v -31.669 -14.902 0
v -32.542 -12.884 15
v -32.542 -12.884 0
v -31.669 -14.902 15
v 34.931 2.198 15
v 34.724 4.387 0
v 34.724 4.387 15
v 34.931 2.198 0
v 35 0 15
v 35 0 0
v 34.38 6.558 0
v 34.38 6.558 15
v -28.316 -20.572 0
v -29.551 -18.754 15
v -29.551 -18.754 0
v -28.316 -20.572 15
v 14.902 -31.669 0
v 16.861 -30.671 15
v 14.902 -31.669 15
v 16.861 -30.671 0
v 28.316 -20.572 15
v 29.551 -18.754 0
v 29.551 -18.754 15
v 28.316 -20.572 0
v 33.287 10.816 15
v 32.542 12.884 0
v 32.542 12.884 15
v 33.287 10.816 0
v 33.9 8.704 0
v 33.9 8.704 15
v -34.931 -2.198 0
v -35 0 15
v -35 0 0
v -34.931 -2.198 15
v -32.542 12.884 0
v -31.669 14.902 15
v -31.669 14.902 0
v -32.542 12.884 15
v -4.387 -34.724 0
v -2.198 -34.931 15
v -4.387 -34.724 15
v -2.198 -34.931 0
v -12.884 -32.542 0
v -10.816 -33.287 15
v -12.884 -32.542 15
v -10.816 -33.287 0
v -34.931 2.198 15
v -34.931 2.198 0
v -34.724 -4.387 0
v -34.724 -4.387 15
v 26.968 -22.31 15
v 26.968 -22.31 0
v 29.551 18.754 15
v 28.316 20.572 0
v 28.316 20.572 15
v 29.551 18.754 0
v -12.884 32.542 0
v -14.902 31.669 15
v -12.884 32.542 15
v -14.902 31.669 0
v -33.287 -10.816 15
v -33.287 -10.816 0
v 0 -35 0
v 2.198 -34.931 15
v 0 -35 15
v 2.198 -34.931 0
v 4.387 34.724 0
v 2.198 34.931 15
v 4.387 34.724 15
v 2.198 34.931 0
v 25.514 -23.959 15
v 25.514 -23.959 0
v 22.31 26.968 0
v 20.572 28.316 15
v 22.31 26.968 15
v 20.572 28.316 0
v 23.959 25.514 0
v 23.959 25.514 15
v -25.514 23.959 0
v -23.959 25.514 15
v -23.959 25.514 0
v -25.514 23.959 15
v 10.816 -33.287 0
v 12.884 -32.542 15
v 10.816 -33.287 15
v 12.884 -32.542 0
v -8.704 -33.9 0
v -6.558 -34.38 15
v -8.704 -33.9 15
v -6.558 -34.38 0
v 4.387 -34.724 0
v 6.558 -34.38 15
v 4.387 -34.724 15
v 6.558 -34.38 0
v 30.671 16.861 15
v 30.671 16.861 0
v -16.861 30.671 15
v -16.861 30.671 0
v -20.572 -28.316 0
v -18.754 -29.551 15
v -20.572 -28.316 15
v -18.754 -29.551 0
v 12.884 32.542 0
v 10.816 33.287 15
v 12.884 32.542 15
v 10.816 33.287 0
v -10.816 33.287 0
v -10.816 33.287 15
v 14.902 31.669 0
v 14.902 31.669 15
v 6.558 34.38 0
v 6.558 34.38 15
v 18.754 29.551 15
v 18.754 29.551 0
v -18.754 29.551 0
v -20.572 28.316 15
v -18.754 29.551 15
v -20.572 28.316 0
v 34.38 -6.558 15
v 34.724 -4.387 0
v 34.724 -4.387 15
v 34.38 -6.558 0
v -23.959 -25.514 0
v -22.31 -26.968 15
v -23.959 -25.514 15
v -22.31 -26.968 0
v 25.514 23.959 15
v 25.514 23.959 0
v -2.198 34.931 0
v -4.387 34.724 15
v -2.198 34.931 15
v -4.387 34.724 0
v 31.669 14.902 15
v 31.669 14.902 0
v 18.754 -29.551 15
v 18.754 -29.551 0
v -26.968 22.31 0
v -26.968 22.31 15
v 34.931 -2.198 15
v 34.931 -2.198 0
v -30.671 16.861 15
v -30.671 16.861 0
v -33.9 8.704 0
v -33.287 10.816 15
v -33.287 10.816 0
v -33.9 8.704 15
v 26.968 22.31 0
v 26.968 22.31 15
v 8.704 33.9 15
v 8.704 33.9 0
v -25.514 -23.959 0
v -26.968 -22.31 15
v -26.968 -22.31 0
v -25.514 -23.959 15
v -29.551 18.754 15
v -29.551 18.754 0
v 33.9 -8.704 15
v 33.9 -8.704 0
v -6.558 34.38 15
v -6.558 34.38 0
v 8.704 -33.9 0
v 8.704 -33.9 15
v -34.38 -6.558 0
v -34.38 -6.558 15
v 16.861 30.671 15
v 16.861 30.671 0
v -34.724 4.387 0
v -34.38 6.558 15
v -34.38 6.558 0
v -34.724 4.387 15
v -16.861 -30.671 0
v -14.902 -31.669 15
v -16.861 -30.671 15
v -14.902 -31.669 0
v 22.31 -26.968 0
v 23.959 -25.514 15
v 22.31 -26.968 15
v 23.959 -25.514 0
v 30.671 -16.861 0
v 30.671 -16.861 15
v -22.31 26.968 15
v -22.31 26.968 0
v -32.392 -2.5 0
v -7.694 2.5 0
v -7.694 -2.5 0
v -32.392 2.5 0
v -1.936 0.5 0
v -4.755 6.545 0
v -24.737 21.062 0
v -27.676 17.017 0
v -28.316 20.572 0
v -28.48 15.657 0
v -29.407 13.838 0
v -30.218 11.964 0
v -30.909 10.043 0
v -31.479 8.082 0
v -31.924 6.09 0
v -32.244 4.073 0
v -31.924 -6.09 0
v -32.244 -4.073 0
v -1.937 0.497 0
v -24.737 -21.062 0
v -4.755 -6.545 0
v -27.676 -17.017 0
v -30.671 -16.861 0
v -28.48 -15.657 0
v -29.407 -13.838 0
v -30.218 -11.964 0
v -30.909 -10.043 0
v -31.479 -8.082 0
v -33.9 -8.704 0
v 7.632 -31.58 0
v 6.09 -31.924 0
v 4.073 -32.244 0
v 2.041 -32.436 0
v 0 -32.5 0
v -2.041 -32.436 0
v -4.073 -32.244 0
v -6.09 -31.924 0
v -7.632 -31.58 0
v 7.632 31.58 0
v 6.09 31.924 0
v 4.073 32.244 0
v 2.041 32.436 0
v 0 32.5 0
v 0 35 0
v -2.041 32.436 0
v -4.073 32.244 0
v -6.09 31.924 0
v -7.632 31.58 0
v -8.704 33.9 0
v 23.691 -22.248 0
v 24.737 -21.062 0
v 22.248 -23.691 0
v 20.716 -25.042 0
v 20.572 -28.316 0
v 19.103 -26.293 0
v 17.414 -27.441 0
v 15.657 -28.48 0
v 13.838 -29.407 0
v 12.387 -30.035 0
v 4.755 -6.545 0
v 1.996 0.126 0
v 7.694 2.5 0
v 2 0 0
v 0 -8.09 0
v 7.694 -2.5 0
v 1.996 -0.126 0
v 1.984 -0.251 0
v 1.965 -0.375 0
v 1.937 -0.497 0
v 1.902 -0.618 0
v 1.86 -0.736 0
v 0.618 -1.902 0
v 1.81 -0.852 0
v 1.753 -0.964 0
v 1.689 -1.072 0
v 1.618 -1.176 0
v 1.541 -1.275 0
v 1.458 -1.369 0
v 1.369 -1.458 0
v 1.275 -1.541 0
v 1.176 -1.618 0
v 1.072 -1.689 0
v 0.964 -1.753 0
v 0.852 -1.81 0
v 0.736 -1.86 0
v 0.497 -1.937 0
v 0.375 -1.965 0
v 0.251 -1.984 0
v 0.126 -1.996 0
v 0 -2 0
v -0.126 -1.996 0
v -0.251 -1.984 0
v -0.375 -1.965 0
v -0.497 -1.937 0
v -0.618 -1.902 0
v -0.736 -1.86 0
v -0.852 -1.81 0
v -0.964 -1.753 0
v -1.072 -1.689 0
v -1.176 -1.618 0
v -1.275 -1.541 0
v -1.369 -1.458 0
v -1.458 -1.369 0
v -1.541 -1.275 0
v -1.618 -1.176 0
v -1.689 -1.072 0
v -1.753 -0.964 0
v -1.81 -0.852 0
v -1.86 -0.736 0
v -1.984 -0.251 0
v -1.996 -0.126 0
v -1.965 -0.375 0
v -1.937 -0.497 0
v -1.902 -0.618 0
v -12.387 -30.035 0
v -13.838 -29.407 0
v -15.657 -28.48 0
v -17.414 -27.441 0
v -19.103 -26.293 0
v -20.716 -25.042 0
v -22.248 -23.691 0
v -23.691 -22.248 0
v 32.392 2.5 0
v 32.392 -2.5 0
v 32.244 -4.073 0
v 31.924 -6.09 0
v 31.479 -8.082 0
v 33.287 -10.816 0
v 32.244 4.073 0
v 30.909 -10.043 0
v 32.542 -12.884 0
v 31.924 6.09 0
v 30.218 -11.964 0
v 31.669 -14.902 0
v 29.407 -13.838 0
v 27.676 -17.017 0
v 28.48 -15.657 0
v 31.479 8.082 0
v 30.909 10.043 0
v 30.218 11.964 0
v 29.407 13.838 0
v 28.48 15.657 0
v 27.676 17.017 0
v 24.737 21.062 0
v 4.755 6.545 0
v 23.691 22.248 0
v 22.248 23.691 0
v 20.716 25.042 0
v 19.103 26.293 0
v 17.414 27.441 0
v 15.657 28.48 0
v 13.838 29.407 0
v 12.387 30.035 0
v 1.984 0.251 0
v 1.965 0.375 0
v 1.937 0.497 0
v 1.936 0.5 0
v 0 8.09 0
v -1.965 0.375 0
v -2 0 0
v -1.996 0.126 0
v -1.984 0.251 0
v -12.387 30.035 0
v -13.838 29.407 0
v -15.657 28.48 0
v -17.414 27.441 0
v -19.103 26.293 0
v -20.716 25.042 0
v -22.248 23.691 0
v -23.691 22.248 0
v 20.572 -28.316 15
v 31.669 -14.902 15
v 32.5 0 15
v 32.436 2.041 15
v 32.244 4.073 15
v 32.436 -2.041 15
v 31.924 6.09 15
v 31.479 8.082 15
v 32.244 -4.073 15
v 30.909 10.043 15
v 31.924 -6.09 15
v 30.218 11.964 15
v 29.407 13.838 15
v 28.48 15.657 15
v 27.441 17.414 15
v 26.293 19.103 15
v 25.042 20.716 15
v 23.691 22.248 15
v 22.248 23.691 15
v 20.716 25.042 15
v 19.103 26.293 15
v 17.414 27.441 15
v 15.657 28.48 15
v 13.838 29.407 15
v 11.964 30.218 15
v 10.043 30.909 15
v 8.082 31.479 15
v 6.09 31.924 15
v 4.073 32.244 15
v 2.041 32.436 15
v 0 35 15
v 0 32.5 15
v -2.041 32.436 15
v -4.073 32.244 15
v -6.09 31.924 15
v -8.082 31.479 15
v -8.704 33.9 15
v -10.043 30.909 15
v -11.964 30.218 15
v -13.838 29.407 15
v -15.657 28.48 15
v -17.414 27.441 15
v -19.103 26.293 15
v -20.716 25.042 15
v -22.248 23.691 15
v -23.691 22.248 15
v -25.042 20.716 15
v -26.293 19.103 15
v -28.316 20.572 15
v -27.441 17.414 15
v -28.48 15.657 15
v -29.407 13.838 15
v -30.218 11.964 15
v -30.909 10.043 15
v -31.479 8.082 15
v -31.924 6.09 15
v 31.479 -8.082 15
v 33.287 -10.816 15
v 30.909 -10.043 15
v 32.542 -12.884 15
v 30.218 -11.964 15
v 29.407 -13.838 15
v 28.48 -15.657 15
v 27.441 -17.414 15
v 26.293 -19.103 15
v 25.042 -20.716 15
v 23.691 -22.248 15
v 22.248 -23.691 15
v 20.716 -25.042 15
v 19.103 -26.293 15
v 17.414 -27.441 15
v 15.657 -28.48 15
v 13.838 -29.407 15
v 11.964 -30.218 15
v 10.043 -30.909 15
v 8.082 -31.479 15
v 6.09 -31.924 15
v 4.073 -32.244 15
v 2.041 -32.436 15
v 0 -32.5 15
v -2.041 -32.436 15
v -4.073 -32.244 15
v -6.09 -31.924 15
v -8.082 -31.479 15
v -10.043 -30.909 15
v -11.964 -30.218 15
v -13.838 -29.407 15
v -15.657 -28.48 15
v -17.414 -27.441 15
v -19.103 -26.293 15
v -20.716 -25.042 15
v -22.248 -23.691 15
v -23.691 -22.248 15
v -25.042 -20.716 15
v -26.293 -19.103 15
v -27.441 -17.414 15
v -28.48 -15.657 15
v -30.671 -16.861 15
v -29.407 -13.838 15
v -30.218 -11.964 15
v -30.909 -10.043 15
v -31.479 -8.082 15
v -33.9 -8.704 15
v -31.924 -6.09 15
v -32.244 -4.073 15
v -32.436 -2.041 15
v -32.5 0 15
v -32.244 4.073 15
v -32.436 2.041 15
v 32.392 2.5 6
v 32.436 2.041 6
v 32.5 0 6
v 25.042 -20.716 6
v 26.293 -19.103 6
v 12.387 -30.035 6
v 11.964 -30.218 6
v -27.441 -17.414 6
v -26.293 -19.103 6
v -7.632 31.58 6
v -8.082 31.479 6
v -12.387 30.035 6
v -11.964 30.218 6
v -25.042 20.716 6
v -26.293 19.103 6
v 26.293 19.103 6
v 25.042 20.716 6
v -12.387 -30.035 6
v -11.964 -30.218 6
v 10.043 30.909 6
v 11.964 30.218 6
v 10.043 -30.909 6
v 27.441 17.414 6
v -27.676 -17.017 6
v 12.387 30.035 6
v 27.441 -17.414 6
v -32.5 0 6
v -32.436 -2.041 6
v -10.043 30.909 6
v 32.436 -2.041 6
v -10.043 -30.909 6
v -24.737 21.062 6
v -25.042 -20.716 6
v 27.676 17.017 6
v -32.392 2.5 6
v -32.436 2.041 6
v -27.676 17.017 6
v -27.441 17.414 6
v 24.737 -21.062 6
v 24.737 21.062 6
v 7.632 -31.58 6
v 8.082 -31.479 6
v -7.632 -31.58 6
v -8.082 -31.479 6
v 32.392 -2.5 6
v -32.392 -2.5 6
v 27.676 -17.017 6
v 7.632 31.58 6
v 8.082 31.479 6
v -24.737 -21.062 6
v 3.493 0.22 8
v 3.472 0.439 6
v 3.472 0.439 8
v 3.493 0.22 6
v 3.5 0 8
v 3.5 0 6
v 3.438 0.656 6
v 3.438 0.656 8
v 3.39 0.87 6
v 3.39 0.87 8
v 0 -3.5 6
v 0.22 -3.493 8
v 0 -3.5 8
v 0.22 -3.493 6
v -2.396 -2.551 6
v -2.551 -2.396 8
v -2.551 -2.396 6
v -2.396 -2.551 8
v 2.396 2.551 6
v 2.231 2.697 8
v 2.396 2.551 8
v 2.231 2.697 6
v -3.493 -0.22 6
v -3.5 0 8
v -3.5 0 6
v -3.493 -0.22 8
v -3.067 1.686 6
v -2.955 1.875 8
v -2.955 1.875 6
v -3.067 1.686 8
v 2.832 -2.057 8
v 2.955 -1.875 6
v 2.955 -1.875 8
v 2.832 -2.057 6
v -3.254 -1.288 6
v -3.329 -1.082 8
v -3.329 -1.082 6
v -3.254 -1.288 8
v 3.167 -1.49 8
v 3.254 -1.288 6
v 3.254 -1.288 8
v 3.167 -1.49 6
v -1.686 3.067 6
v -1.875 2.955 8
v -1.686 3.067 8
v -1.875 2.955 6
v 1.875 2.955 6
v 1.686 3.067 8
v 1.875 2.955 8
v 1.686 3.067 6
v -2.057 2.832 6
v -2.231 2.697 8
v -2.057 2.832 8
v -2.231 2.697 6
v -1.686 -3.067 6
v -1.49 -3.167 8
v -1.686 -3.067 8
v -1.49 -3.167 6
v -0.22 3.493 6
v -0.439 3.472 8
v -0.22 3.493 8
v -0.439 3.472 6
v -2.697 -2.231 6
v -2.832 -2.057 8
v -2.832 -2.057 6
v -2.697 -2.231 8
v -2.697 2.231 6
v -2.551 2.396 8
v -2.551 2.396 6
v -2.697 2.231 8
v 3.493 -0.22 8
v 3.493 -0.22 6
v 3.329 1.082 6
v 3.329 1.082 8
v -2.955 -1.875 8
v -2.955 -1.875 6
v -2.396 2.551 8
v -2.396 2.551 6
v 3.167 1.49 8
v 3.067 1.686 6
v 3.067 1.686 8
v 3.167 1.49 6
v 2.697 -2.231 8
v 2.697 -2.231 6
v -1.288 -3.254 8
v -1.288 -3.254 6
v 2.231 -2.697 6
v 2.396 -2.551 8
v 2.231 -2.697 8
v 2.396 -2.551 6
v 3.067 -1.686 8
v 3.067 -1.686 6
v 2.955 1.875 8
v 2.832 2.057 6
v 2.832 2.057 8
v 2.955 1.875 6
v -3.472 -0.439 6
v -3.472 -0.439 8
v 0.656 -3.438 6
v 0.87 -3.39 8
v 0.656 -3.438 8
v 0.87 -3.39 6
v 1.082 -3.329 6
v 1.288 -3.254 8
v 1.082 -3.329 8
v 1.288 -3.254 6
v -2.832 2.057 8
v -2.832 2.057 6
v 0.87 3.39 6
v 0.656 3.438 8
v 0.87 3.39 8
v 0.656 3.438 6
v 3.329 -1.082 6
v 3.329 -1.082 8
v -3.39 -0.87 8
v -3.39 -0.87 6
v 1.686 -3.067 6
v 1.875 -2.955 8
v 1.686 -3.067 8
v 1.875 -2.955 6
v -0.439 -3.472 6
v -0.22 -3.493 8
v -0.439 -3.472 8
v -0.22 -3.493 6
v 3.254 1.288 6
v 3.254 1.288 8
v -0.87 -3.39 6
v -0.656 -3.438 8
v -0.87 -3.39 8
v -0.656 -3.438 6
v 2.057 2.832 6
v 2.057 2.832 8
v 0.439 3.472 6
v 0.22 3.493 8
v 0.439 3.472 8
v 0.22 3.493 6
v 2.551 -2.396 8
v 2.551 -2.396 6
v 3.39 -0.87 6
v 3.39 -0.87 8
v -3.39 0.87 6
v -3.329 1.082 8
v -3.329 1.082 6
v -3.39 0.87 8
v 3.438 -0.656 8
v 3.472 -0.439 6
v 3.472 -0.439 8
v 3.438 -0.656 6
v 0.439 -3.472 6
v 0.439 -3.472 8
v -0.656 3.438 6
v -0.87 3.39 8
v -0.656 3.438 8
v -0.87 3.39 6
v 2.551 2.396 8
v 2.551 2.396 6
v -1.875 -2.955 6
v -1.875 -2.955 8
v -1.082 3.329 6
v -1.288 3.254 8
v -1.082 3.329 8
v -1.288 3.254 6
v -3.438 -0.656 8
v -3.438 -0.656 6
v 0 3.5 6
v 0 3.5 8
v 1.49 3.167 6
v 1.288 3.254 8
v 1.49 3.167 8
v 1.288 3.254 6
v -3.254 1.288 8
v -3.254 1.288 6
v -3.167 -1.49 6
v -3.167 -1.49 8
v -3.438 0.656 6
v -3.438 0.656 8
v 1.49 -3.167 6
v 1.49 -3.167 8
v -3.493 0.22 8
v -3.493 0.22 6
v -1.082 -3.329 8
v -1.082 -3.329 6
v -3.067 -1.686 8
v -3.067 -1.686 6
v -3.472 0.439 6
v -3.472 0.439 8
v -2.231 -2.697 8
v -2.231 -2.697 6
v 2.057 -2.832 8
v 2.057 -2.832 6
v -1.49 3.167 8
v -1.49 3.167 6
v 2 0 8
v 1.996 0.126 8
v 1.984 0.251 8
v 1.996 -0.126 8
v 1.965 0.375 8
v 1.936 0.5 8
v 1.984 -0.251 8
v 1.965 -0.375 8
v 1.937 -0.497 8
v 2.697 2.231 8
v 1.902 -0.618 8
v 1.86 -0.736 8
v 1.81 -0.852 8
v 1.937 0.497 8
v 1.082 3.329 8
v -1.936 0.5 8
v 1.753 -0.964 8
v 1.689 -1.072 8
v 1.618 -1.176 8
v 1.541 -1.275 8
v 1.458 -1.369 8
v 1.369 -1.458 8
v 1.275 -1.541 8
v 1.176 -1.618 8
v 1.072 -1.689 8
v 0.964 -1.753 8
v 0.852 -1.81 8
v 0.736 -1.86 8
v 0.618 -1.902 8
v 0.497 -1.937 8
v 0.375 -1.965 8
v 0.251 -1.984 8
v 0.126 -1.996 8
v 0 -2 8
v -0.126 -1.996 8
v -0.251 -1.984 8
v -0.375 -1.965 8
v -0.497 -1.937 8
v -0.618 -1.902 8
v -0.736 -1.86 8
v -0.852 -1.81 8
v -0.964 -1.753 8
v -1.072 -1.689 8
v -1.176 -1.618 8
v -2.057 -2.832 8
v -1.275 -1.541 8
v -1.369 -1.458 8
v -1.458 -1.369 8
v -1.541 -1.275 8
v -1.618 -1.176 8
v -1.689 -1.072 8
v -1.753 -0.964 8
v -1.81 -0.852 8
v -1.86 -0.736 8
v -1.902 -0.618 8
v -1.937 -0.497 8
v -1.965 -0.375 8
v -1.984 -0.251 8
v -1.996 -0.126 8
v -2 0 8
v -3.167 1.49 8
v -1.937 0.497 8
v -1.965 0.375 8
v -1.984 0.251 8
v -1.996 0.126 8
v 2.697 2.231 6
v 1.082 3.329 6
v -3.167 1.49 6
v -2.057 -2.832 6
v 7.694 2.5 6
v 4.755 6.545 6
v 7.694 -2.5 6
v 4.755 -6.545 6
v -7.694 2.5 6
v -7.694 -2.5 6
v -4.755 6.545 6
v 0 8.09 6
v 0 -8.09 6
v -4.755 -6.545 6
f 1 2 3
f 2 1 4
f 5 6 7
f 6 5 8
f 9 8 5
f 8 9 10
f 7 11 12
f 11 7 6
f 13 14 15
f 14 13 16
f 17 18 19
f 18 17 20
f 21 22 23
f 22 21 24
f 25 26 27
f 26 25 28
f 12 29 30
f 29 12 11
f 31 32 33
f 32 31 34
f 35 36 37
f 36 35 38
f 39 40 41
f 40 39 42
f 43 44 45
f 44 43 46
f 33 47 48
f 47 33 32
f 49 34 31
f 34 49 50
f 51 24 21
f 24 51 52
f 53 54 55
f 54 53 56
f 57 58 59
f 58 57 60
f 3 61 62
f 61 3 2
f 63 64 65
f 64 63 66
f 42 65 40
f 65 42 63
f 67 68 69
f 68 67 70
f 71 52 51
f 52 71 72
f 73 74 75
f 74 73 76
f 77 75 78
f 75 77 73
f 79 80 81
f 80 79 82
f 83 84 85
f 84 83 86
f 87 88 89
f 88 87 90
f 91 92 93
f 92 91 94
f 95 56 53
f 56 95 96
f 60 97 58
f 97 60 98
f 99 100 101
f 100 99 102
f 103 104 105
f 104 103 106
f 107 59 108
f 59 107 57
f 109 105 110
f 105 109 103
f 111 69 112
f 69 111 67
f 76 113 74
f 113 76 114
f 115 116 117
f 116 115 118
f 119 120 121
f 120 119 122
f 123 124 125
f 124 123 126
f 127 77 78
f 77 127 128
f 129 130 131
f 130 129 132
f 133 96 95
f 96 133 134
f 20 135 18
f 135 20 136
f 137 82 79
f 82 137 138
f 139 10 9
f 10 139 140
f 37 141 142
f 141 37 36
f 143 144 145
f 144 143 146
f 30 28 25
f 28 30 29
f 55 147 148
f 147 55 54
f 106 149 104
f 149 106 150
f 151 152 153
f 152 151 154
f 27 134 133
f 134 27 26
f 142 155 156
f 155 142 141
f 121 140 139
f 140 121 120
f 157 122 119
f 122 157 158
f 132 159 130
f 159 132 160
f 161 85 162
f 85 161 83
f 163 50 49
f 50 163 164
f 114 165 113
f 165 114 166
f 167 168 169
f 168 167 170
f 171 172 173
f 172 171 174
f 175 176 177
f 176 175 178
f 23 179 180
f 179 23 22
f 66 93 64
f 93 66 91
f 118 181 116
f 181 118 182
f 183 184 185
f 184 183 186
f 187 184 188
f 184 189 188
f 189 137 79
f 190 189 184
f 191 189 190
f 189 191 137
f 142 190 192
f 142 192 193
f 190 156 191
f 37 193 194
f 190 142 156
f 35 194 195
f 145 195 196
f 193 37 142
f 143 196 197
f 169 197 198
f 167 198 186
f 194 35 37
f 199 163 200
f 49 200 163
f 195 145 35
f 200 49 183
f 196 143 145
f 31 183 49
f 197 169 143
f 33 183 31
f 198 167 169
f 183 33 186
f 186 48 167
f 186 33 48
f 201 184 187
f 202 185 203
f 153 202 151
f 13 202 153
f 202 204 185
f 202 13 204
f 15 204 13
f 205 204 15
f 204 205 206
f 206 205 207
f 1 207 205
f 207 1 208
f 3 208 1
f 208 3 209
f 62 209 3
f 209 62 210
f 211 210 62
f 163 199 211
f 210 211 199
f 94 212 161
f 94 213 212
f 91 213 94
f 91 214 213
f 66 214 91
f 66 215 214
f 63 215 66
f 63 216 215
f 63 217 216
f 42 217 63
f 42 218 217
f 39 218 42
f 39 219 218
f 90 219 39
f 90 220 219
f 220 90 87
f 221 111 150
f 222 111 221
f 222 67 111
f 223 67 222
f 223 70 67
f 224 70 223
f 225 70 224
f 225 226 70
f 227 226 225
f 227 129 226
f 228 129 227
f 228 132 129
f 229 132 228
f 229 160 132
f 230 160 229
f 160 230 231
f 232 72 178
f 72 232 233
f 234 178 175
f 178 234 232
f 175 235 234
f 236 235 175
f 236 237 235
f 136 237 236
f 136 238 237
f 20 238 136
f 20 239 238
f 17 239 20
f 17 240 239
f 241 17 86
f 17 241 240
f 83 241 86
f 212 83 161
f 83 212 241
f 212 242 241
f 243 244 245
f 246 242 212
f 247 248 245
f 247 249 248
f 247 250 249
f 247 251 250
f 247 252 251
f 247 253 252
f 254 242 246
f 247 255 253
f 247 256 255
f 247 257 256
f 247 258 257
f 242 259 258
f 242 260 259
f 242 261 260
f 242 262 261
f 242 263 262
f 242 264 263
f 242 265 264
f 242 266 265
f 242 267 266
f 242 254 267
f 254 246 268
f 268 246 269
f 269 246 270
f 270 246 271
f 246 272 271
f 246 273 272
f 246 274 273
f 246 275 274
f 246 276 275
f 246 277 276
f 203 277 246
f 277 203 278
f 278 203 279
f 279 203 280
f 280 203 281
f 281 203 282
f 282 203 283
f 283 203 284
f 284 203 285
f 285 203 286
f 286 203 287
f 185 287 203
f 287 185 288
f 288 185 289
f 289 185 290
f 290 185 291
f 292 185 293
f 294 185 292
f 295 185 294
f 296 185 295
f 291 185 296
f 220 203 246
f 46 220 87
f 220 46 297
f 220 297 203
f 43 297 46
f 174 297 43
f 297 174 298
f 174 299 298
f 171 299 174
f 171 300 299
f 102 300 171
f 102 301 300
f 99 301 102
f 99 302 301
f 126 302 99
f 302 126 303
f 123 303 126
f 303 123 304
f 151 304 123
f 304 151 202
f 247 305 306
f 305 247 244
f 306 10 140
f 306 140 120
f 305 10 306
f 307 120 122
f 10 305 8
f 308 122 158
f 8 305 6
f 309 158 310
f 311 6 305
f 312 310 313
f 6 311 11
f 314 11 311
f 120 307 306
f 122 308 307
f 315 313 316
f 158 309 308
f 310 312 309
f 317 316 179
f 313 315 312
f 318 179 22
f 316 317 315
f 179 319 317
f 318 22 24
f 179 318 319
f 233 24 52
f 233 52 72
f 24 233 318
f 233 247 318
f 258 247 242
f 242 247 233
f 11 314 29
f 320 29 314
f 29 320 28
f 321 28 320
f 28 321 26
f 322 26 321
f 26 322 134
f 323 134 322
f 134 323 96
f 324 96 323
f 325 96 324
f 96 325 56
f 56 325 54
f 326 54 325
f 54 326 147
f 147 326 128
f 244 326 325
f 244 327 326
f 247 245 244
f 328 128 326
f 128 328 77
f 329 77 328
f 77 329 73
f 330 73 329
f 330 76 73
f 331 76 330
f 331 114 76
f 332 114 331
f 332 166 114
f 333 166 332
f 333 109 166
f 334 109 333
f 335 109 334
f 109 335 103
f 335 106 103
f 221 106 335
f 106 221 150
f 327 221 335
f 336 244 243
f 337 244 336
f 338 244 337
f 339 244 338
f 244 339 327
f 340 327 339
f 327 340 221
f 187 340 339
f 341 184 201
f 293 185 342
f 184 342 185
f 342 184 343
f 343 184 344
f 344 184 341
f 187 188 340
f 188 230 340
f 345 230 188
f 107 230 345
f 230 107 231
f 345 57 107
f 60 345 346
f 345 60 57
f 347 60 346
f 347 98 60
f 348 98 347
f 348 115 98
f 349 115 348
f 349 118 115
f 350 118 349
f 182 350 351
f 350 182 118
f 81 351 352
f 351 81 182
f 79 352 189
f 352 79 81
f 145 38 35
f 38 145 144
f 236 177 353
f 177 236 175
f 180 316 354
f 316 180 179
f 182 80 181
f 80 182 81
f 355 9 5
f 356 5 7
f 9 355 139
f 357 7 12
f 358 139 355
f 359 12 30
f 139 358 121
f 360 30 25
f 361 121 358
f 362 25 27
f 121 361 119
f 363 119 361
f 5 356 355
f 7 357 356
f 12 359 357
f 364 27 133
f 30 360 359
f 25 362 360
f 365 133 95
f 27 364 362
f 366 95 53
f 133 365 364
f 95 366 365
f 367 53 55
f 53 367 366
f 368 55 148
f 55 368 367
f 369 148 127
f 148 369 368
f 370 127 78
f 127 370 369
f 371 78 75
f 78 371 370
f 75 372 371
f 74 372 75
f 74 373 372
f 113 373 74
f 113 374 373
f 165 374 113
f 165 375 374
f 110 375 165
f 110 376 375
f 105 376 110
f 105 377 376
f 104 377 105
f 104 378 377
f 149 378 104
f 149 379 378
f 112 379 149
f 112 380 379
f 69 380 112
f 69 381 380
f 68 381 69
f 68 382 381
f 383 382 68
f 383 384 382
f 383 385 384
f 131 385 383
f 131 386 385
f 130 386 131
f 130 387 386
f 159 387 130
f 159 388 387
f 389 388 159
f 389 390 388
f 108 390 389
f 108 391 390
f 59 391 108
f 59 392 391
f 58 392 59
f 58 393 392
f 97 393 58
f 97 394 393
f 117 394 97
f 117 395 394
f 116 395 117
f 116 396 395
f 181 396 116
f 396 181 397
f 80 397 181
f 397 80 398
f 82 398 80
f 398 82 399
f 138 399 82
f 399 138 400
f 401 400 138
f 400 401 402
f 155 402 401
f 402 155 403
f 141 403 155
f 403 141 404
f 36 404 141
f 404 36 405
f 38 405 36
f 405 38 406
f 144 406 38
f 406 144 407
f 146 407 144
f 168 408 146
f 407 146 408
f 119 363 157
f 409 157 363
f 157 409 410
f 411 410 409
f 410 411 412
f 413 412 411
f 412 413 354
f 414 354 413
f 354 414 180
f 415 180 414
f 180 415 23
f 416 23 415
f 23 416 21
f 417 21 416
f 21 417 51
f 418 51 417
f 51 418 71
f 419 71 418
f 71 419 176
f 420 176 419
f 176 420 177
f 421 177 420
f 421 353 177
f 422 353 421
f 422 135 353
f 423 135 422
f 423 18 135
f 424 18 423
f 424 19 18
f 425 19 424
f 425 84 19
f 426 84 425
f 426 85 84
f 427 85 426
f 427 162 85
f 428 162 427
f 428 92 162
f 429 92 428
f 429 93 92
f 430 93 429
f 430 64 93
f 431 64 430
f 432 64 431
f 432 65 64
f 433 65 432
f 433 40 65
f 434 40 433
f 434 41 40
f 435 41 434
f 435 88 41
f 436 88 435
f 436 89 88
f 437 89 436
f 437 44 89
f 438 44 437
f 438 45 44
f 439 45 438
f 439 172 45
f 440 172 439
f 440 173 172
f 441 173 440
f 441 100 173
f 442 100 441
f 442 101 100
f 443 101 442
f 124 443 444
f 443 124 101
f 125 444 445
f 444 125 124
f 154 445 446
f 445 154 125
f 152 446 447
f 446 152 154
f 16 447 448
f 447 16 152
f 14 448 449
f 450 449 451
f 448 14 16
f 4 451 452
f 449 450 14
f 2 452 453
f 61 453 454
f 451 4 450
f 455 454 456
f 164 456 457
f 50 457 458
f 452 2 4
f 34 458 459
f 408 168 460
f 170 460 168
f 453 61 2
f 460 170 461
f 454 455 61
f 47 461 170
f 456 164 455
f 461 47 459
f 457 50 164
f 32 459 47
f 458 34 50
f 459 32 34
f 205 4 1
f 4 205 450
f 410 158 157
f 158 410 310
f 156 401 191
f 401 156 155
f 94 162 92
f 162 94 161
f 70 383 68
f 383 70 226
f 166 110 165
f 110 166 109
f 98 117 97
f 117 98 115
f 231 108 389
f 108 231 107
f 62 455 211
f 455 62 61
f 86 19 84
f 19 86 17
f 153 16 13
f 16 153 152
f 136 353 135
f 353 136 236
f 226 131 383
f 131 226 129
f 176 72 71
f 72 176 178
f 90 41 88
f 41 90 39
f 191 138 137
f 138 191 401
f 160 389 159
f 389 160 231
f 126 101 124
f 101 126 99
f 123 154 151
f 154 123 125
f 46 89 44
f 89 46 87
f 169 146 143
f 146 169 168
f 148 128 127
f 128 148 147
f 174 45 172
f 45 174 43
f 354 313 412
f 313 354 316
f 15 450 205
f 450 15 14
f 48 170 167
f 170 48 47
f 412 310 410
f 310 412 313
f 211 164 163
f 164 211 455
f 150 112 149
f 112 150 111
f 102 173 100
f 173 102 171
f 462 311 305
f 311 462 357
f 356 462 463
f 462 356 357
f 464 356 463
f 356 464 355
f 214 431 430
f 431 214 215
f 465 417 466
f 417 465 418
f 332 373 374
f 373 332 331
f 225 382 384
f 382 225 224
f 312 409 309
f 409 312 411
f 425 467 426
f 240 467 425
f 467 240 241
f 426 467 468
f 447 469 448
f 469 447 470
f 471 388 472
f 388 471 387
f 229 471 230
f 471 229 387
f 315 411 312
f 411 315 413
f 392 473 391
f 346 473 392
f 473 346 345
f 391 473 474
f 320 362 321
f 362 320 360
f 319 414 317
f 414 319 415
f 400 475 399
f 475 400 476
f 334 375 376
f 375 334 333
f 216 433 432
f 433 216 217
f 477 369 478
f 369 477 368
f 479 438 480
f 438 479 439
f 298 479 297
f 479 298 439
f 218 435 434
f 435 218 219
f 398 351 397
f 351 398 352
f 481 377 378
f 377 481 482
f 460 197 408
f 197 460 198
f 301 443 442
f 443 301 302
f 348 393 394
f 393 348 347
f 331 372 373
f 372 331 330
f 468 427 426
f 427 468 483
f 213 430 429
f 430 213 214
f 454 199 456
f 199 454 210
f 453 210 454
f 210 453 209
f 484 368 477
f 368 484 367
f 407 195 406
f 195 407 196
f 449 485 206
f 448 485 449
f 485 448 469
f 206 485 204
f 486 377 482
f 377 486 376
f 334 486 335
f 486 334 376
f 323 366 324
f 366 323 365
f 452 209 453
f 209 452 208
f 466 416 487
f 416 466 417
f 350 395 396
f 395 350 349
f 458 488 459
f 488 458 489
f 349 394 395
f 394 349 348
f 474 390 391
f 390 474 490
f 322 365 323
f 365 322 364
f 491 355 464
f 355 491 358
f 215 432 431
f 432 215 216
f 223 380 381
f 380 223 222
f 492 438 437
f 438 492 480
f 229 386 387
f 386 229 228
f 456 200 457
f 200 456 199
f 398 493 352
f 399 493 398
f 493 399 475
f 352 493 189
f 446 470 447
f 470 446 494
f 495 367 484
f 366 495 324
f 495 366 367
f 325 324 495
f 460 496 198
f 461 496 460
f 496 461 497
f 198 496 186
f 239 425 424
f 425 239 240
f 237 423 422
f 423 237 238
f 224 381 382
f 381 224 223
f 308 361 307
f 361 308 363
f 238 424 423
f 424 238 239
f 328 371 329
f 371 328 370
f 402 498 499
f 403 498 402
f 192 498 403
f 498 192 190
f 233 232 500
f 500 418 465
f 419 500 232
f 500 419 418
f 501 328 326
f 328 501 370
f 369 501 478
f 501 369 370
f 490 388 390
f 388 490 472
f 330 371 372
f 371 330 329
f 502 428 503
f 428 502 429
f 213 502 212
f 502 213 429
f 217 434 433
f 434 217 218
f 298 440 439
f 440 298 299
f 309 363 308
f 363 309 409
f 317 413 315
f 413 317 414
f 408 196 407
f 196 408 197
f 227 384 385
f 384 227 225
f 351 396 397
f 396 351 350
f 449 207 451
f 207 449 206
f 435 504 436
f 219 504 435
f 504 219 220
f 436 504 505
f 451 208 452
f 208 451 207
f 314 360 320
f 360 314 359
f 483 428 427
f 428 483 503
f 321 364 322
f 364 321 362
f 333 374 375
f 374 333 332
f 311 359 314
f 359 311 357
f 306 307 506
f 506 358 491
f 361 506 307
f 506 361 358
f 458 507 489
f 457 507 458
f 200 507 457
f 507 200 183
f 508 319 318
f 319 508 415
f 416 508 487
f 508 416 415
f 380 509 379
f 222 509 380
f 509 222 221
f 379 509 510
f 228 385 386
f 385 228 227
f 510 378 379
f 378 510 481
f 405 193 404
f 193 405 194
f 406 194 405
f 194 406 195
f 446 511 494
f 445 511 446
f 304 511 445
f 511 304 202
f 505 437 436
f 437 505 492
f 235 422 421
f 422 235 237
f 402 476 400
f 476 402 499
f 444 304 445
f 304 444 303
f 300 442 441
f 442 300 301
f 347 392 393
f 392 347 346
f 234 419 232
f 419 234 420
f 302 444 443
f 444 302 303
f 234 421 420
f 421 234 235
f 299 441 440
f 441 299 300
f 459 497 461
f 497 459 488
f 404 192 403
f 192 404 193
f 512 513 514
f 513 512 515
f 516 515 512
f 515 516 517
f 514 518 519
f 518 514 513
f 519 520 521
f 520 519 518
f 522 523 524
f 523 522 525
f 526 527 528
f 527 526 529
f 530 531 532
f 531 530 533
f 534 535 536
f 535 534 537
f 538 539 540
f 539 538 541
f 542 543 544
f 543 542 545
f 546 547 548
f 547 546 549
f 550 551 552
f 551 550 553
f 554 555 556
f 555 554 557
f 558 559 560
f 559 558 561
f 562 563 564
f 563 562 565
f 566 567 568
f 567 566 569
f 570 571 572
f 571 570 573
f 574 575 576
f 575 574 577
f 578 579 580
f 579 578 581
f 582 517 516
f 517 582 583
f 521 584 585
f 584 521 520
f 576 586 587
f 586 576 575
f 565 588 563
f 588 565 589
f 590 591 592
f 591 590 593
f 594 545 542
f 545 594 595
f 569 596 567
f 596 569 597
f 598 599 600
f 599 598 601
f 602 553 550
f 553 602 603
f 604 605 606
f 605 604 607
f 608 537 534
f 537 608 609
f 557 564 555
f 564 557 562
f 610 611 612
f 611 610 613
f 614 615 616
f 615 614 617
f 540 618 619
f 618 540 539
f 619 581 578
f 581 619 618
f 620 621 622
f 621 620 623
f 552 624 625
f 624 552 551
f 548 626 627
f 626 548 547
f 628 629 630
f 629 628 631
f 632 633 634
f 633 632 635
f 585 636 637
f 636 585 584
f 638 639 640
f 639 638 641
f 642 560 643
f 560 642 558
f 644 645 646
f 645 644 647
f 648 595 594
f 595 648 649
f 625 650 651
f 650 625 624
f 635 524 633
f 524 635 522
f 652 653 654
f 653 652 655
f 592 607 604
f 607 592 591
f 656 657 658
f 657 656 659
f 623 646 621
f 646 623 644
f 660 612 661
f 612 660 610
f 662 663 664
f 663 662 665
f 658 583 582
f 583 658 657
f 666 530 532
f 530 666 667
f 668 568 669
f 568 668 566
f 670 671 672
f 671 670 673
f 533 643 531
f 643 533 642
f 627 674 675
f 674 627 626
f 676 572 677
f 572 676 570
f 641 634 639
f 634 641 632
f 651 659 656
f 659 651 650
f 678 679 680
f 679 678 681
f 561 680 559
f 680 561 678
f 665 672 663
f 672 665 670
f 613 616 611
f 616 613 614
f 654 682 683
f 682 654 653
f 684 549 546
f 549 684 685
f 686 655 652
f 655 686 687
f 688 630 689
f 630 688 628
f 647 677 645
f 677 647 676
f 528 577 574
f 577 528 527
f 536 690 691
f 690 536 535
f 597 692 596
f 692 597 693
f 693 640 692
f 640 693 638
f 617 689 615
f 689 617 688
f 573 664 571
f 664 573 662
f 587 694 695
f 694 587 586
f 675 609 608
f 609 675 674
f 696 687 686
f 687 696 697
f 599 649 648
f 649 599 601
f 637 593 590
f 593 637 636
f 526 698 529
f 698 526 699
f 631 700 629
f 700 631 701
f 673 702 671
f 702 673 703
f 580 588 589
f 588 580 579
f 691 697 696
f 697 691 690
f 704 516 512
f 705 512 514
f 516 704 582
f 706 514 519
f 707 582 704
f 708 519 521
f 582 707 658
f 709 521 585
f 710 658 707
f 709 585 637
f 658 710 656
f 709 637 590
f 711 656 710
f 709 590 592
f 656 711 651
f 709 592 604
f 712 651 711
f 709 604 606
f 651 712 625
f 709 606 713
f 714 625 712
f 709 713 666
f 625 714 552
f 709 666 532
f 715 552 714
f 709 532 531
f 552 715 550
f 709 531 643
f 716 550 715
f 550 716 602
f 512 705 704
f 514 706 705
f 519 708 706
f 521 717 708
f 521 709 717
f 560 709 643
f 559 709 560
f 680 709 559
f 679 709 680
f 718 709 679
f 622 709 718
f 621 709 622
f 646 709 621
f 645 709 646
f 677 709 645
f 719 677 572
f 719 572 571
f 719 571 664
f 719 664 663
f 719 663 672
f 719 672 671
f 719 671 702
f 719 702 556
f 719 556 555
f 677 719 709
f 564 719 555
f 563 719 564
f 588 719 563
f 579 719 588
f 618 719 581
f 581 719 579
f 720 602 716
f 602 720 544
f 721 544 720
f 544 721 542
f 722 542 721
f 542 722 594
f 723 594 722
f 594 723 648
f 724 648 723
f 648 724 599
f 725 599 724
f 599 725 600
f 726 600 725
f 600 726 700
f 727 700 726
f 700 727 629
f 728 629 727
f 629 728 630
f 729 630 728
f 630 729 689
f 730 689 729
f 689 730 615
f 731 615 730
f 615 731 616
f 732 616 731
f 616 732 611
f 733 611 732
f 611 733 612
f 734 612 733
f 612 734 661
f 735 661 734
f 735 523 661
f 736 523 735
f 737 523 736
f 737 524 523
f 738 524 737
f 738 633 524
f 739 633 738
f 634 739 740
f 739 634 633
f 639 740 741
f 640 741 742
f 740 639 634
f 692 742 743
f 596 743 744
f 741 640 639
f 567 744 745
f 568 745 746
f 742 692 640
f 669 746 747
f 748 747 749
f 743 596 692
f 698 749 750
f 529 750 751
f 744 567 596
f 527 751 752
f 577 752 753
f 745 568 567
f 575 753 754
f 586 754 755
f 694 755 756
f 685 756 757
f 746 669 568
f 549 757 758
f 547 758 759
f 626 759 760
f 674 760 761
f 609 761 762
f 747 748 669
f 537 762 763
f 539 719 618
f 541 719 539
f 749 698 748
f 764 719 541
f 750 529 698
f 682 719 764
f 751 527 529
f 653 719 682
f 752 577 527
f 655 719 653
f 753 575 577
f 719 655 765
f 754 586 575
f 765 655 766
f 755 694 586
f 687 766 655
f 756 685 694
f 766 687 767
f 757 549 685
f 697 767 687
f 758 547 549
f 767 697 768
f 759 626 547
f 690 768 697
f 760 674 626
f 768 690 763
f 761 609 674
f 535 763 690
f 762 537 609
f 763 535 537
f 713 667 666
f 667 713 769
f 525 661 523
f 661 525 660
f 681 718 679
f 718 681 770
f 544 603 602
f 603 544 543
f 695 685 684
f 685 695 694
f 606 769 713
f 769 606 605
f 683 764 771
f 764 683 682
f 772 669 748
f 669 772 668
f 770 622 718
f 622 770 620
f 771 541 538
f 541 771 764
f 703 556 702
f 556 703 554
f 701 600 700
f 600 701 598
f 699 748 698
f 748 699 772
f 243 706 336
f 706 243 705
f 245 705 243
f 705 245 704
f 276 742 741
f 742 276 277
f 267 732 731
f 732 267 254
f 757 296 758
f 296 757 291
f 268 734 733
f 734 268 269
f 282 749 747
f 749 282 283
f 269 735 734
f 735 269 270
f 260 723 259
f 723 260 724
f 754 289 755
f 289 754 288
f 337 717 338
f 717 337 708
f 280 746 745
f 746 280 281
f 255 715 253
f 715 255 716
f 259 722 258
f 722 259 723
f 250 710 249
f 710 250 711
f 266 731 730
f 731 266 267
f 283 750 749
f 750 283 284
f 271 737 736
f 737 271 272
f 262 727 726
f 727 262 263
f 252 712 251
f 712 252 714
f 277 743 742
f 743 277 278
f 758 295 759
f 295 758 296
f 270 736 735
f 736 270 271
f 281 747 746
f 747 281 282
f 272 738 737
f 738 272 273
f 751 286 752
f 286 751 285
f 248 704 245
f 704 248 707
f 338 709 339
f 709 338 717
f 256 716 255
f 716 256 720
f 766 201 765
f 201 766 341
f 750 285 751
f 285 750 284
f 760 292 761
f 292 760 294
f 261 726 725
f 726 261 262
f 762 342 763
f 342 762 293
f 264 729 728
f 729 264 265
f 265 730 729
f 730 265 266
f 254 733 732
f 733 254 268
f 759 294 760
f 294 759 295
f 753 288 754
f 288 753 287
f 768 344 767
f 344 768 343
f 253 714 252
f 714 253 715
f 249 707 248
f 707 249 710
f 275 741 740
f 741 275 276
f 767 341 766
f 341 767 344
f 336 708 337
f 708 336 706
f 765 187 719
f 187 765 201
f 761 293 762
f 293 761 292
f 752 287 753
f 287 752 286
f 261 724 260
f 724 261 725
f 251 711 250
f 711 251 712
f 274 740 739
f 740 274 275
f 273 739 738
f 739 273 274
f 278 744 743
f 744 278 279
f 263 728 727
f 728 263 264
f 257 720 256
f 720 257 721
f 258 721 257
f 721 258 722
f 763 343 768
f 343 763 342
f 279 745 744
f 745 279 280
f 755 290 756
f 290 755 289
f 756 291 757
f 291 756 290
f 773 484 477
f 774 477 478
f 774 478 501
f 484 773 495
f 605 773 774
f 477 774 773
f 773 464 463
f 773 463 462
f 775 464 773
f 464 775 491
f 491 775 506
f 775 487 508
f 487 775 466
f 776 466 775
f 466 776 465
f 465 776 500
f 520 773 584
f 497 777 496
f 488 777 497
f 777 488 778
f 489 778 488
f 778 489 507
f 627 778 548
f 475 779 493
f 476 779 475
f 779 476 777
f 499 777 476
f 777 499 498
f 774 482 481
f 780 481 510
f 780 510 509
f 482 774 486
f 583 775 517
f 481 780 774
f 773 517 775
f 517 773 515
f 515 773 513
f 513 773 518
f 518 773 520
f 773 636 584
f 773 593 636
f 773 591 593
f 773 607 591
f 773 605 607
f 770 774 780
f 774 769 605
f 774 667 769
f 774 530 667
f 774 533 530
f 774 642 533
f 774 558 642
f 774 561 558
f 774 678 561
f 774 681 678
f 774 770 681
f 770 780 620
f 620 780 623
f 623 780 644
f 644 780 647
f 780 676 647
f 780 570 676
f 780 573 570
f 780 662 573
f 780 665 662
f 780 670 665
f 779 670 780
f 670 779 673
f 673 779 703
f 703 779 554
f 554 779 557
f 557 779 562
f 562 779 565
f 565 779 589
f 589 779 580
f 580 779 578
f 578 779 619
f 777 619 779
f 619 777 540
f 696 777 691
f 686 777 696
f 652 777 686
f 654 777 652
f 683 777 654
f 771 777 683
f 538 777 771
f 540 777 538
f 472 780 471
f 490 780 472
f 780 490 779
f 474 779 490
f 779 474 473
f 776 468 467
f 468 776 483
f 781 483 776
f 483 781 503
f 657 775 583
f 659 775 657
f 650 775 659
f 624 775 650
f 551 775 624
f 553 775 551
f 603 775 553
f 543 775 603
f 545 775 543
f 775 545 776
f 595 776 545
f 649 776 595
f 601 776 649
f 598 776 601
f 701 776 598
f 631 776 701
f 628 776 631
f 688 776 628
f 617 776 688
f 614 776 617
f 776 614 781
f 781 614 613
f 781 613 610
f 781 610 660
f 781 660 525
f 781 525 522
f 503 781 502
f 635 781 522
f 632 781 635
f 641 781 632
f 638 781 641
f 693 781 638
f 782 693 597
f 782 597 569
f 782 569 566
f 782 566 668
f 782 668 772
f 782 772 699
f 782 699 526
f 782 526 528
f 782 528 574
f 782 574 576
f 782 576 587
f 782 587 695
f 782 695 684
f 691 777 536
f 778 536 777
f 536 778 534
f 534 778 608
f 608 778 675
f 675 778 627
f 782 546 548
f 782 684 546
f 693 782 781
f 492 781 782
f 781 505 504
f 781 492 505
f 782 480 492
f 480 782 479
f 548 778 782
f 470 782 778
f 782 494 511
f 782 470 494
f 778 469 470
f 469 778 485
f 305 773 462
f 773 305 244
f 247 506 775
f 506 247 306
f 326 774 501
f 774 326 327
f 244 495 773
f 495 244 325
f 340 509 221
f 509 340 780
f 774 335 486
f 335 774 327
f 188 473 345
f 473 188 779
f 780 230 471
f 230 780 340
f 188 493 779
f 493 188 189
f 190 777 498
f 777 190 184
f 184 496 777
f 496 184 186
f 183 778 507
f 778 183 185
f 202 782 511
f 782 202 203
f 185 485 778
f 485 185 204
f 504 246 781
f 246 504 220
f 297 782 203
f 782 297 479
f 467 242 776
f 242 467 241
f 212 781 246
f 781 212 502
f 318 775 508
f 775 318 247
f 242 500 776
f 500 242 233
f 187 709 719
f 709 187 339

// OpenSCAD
/*
 * Wheel Generator v1.0
 *
 * http://www.thingiverse.com/thing:1887576
 *
 * By: Maxstupo
 */

// (The outer diameter of the wheel):
outerDiameter = 70; 

// (The width of the wheel):
treadWidth = 15;

// (The thickness of the outer wheel ring):
treadThickness = 5; 

// (The axle diameter):
shaftDiameter = 4; 

// (The thickness of the hub):
hubThickness = 3; 

// (The width of the hub):
hubWidth = 8; 

// (If true use a keyed shaft hole):
useKey=true; // [true,false]

// (The offset of the key from the centre of the hole):
keyWidth = 0.5; 

// (Number of spokes):
spokeCount = 10;

// (The width of each spoke):
spokeWidth = 5; 

// (The height of each spoke in Z axis):
spokeThickness = 6;

/* [Misc] */
$fn = 100;


union(){
    hollowCylinder(outerDiameter,outerDiameter-treadThickness,treadWidth); // The "wheel"
 
    union(){
        hollowCylinder(shaftDiameter+hubThickness,shaftDiameter,hubWidth); // The wheel hub
        
        // Spokes
        difference(){
            union(){
                for (i = [0 : (360 / spokeCount) : 360]) {
                    rotate([0,0,i])translate([0,-spokeWidth/2,0]) cube([outerDiameter/2,spokeWidth,spokeThickness]);   
                }
            }
            translate([0,0,-1]) cylinder(h=spokeThickness+2,d=shaftDiameter);
            translate([0,0,-1]) hollowCylinder(outerDiameter+treadThickness,outerDiameter,spokeThickness+2);
        }
         
        // Make the shaft hole keyed
        if(useKey){
            difference(){
                translate([-shaftDiameter/2,keyWidth,0]) cube([shaftDiameter,shaftDiameter/2-keyWidth,hubWidth]);
                translate([0,0,-1]) hollowCylinder(outerDiameter-treadThickness,shaftDiameter+hubThickness,hubWidth+2);
            }
        }
    }
}

module hollowCylinder(od,id,h){
    difference(){
        cylinder(d=od,h=h);
        translate([0,0,-1]) cylinder(d=id,h=h+2);
    }
}
